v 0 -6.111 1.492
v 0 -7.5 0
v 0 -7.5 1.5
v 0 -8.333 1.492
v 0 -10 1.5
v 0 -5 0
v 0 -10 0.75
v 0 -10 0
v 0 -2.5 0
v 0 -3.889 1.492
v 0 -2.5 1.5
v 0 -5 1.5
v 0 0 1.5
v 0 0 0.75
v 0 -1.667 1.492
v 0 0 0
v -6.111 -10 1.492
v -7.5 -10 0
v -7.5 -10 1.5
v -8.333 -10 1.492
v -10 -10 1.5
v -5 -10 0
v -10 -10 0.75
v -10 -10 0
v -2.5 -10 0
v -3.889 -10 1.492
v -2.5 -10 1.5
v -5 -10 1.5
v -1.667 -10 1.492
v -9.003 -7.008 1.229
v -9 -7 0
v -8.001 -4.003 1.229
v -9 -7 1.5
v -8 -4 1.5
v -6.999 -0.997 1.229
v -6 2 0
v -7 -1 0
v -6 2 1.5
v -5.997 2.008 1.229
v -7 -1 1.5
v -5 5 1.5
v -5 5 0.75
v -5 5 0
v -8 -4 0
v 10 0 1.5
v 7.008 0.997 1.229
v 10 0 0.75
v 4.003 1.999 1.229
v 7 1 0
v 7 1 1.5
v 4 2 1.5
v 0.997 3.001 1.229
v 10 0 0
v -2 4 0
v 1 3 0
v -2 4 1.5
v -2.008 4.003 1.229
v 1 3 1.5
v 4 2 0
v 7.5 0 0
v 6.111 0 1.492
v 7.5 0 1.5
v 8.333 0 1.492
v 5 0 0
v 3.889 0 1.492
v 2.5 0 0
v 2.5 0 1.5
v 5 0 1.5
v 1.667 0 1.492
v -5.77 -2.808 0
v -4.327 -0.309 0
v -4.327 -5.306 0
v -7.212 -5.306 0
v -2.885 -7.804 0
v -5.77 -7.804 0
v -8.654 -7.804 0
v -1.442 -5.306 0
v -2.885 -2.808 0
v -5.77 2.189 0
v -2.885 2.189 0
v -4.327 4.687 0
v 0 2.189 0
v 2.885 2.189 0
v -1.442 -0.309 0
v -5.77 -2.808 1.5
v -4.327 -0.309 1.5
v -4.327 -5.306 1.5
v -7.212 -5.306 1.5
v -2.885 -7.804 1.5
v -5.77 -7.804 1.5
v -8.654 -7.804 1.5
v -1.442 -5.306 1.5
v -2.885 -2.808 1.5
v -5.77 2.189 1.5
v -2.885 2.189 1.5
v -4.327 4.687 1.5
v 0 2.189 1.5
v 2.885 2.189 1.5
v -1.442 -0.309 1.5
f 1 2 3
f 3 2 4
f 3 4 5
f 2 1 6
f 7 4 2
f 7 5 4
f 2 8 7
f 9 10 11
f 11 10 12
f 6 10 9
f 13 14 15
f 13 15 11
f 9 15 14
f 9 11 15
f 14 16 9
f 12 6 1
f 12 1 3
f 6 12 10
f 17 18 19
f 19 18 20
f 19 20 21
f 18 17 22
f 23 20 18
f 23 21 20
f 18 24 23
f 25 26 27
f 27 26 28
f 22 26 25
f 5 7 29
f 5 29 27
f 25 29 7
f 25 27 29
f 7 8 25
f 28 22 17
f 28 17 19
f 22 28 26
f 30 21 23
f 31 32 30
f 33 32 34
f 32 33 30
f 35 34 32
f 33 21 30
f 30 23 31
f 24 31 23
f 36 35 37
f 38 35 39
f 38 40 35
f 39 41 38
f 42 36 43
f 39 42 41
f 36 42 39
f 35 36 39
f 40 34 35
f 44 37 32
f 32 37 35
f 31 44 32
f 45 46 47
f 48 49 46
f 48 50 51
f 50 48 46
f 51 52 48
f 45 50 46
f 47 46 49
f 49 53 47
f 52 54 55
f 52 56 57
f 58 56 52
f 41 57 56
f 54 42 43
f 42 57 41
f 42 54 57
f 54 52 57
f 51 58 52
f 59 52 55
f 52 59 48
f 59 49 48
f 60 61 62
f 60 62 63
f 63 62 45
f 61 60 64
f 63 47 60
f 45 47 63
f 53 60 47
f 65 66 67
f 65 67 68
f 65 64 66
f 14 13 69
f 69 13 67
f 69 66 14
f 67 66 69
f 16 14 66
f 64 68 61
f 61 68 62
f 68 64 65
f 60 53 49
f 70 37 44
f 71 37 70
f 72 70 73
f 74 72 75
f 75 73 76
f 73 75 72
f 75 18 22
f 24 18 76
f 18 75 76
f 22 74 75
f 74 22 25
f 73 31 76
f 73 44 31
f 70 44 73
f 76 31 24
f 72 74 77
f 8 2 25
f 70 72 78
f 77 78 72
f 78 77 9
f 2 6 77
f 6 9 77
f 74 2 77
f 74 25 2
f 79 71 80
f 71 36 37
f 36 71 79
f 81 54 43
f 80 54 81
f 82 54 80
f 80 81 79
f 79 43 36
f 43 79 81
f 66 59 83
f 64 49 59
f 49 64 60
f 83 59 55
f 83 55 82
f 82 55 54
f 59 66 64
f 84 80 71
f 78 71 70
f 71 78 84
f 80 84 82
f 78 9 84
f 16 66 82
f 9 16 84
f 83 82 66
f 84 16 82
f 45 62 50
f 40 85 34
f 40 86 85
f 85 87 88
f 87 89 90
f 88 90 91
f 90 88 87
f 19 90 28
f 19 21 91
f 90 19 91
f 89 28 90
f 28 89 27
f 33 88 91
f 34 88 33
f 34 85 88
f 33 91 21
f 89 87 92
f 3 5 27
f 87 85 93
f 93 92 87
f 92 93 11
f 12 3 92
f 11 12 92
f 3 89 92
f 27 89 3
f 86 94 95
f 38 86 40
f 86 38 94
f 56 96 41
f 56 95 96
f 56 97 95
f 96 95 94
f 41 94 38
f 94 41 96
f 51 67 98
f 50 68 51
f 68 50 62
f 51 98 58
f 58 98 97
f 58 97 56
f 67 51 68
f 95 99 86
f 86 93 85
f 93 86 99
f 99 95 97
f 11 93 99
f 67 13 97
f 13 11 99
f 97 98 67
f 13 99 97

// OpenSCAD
// CSG file generated from FreeCAD 0.20.29177 (Git)
group() {
 group(){
polyhedron ( points = [[0.000000,0.000000,0.000000],[0.000000,0.000000,1.500000],[0.000000,-10.000000,0.000000],[0.000000,-10.000000,1.500000],[-10.000000,-10.000000,0.000000],[-10.000000,-10.000000,1.500000],[-5.000000,5.000000,0.000000],[-5.000000,5.000000,1.500000],[10.000000,0.000000,0.000000],[10.000000,0.000000,1.500000],[0.000000,0.000000,0.750000],[0.000000,-10.000000,0.750000],[0.000000,-2.500000,0.000000],[0.000000,-5.000000,0.000000],[0.000000,-7.500000,0.000000],[0.000000,-2.500000,1.500000],[0.000000,-5.000000,1.500000],[0.000000,-7.500000,1.500000],[-10.000000,-10.000000,0.750000],[-2.500000,-10.000000,0.000000],[-5.000000,-10.000000,0.000000],[-7.500000,-10.000000,0.000000],[-2.500000,-10.000000,1.500000],[-5.000000,-10.000000,1.500000],[-7.500000,-10.000000,1.500000],[-5.000000,5.000000,0.750000],[-6.000000,2.000000,0.000000],[-7.000000,-1.000000,0.000000],[-8.000000,-4.000000,0.000000],[-9.000000,-7.000000,0.000000],[-6.000000,2.000000,1.500000],[-7.000000,-1.000000,1.500000],[-8.000000,-4.000000,1.500000],[-9.000000,-7.000000,1.500000],[10.000000,0.000000,0.750000],[-2.000000,4.000000,0.000000],[1.000000,3.000000,0.000000],[4.000000,2.000000,0.000000],[7.000000,1.000000,0.000000],[-2.000000,4.000000,1.500000],[1.000000,3.000000,1.500000],[4.000000,2.000000,1.500000],[7.000000,1.000000,1.500000],[2.500000,0.000000,0.000000],[5.000000,0.000000,0.000000],[7.500000,0.000000,0.000000],[2.500000,0.000000,1.500000],[5.000000,0.000000,1.500000],[7.500000,0.000000,1.500000],[0.000000,-8.333480,1.492081],[0.000000,-6.111160,1.492081],[0.000000,-3.888840,1.492081],[0.000000,-1.666520,1.492081],[-8.333480,-10.000000,1.492081],[-6.111160,-10.000000,1.492081],[-3.888840,-10.000000,1.492081],[-1.666520,-10.000000,1.492081],[-9.002785,-7.008354,1.229358],[-8.000928,-4.002785,1.229358],[-6.999072,-0.997215,1.229358],[-5.997215,2.008354,1.229358],[7.008354,0.997215,1.229358],[4.002785,1.999072,1.229358],[0.997215,3.000928,1.229358],[-2.008354,4.002785,1.229358],[8.333480,0.000000,1.492081],[6.111160,0.000000,1.492081],[3.888840,0.000000,1.492081],[1.666520,0.000000,1.492081],[-5.769617,-2.807765,0.000000],[-2.884809,-7.804400,0.000000],[-8.654426,-7.804400,0.000000],[-2.884809,2.188869,0.000000],[2.884809,2.188869,0.000000],[-4.327213,-5.306083,0.000000],[-7.212021,-5.306083,0.000000],[-5.769617,-7.804400,0.000000],[-1.442404,-5.306083,0.000000],[-2.884809,-2.807765,0.000000],[-4.327213,-0.309448,0.000000],[-5.769617,2.188869,0.000000],[-4.327213,4.687187,0.000000],[-0.000000,2.188869,0.000000],[-1.442404,-0.309448,0.000000],[-5.769617,-2.807765,1.500000],[-2.884809,-7.804400,1.500000],[-8.654426,-7.804400,1.500000],[-2.884809,2.188869,1.500000],[2.884809,2.188869,1.500000],[-4.327213,-5.306083,1.500000],[-7.212021,-5.306083,1.500000],[-5.769617,-7.804400,1.500000],[-1.442404,-5.306083,1.500000],[-2.884809,-2.807765,1.500000],[-4.327213,-0.309448,1.500000],[-5.769617,2.188869,1.500000],[-4.327213,4.687187,1.500000],[-0.000000,2.188869,1.500000],[-1.442404,-0.309448,1.500000]], faces = [[17,14,50],[49,14,17],[3,49,17],[13,50,14],[14,49,11],[49,3,11],[11,2,14],[15,51,12],[16,51,15],[12,51,13],[52,10,1],[15,52,1],[10,52,12],[52,15,12],[12,0,10],[50,13,16],[17,50,16],[51,16,13],[24,21,54],[53,21,24],[5,53,24],[20,54,21],[21,53,18],[53,5,18],[18,4,21],[22,55,19],[23,55,22],[19,55,20],[56,11,3],[22,56,3],[11,56,19],[56,22,19],[19,2,11],[54,20,23],[24,54,23],[55,23,20],[18,5,57],[57,58,29],[32,58,33],[57,33,58],[58,32,59],[57,5,33],[29,18,57],[18,29,4],[27,59,26],[60,59,30],[59,31,30],[30,7,60],[6,26,25],[7,25,60],[60,25,26],[60,26,59],[59,32,31],[58,27,28],[59,27,58],[58,28,29],[34,61,9],[61,38,62],[41,42,62],[61,62,42],[62,63,41],[61,42,9],[38,61,34],[34,8,38],[36,35,63],[64,39,63],[63,39,40],[39,64,7],[6,25,35],[7,64,25],[64,35,25],[64,63,35],[63,40,41],[36,63,37],[62,37,63],[62,38,37],[48,66,45],[65,48,45],[9,48,65],[44,45,66],[45,34,65],[65,34,9],[34,45,8],[46,43,67],[47,46,67],[43,44,67],[68,1,10],[46,1,68],[10,43,68],[68,43,46],[43,10,0],[66,47,44],[48,47,66],[67,44,47],[38,8,45],[28,27,69],[69,27,79],[75,69,74],[76,74,70],[71,75,76],[74,76,75],[20,21,76],[71,21,4],[71,76,21],[76,70,20],[19,20,70],[71,29,75],[29,28,75],[75,28,69],[4,29,71],[77,70,74],[19,14,2],[78,74,69],[74,78,77],[12,77,78],[77,13,14],[77,12,13],[77,14,70],[14,19,70],[72,79,80],[27,26,79],[80,79,26],[6,35,81],[81,35,72],[72,35,82],[80,81,72],[26,6,80],[81,80,6],[73,37,43],[37,38,44],[45,44,38],[36,37,73],[82,36,73],[35,36,82],[44,43,37],[79,72,83],[69,79,78],[83,78,79],[82,83,72],[83,12,78],[82,43,0],[83,0,12],[43,82,73],[82,0,83],[42,48,9],[32,84,31],[84,94,31],[90,89,84],[91,85,89],[86,91,90],[89,90,91],[23,91,24],[86,5,24],[86,24,91],[91,23,85],[22,85,23],[86,90,33],[33,90,32],[90,84,32],[5,86,33],[92,89,85],[22,3,17],[93,84,89],[89,92,93],[15,93,92],[92,17,16],[92,16,15],[92,85,17],[17,85,22],[87,95,94],[31,94,30],[95,30,94],[7,96,39],[96,87,39],[87,97,39],[95,87,96],[30,95,7],[96,7,95],[88,46,41],[41,47,42],[48,42,47],[40,88,41],[97,88,40],[39,97,40],[47,41,46],[94,98,87],[84,93,94],[98,94,93],[97,87,98],[98,93,15],[97,1,46],[98,15,1],[46,88,97],[97,98,1]]);
}
}
